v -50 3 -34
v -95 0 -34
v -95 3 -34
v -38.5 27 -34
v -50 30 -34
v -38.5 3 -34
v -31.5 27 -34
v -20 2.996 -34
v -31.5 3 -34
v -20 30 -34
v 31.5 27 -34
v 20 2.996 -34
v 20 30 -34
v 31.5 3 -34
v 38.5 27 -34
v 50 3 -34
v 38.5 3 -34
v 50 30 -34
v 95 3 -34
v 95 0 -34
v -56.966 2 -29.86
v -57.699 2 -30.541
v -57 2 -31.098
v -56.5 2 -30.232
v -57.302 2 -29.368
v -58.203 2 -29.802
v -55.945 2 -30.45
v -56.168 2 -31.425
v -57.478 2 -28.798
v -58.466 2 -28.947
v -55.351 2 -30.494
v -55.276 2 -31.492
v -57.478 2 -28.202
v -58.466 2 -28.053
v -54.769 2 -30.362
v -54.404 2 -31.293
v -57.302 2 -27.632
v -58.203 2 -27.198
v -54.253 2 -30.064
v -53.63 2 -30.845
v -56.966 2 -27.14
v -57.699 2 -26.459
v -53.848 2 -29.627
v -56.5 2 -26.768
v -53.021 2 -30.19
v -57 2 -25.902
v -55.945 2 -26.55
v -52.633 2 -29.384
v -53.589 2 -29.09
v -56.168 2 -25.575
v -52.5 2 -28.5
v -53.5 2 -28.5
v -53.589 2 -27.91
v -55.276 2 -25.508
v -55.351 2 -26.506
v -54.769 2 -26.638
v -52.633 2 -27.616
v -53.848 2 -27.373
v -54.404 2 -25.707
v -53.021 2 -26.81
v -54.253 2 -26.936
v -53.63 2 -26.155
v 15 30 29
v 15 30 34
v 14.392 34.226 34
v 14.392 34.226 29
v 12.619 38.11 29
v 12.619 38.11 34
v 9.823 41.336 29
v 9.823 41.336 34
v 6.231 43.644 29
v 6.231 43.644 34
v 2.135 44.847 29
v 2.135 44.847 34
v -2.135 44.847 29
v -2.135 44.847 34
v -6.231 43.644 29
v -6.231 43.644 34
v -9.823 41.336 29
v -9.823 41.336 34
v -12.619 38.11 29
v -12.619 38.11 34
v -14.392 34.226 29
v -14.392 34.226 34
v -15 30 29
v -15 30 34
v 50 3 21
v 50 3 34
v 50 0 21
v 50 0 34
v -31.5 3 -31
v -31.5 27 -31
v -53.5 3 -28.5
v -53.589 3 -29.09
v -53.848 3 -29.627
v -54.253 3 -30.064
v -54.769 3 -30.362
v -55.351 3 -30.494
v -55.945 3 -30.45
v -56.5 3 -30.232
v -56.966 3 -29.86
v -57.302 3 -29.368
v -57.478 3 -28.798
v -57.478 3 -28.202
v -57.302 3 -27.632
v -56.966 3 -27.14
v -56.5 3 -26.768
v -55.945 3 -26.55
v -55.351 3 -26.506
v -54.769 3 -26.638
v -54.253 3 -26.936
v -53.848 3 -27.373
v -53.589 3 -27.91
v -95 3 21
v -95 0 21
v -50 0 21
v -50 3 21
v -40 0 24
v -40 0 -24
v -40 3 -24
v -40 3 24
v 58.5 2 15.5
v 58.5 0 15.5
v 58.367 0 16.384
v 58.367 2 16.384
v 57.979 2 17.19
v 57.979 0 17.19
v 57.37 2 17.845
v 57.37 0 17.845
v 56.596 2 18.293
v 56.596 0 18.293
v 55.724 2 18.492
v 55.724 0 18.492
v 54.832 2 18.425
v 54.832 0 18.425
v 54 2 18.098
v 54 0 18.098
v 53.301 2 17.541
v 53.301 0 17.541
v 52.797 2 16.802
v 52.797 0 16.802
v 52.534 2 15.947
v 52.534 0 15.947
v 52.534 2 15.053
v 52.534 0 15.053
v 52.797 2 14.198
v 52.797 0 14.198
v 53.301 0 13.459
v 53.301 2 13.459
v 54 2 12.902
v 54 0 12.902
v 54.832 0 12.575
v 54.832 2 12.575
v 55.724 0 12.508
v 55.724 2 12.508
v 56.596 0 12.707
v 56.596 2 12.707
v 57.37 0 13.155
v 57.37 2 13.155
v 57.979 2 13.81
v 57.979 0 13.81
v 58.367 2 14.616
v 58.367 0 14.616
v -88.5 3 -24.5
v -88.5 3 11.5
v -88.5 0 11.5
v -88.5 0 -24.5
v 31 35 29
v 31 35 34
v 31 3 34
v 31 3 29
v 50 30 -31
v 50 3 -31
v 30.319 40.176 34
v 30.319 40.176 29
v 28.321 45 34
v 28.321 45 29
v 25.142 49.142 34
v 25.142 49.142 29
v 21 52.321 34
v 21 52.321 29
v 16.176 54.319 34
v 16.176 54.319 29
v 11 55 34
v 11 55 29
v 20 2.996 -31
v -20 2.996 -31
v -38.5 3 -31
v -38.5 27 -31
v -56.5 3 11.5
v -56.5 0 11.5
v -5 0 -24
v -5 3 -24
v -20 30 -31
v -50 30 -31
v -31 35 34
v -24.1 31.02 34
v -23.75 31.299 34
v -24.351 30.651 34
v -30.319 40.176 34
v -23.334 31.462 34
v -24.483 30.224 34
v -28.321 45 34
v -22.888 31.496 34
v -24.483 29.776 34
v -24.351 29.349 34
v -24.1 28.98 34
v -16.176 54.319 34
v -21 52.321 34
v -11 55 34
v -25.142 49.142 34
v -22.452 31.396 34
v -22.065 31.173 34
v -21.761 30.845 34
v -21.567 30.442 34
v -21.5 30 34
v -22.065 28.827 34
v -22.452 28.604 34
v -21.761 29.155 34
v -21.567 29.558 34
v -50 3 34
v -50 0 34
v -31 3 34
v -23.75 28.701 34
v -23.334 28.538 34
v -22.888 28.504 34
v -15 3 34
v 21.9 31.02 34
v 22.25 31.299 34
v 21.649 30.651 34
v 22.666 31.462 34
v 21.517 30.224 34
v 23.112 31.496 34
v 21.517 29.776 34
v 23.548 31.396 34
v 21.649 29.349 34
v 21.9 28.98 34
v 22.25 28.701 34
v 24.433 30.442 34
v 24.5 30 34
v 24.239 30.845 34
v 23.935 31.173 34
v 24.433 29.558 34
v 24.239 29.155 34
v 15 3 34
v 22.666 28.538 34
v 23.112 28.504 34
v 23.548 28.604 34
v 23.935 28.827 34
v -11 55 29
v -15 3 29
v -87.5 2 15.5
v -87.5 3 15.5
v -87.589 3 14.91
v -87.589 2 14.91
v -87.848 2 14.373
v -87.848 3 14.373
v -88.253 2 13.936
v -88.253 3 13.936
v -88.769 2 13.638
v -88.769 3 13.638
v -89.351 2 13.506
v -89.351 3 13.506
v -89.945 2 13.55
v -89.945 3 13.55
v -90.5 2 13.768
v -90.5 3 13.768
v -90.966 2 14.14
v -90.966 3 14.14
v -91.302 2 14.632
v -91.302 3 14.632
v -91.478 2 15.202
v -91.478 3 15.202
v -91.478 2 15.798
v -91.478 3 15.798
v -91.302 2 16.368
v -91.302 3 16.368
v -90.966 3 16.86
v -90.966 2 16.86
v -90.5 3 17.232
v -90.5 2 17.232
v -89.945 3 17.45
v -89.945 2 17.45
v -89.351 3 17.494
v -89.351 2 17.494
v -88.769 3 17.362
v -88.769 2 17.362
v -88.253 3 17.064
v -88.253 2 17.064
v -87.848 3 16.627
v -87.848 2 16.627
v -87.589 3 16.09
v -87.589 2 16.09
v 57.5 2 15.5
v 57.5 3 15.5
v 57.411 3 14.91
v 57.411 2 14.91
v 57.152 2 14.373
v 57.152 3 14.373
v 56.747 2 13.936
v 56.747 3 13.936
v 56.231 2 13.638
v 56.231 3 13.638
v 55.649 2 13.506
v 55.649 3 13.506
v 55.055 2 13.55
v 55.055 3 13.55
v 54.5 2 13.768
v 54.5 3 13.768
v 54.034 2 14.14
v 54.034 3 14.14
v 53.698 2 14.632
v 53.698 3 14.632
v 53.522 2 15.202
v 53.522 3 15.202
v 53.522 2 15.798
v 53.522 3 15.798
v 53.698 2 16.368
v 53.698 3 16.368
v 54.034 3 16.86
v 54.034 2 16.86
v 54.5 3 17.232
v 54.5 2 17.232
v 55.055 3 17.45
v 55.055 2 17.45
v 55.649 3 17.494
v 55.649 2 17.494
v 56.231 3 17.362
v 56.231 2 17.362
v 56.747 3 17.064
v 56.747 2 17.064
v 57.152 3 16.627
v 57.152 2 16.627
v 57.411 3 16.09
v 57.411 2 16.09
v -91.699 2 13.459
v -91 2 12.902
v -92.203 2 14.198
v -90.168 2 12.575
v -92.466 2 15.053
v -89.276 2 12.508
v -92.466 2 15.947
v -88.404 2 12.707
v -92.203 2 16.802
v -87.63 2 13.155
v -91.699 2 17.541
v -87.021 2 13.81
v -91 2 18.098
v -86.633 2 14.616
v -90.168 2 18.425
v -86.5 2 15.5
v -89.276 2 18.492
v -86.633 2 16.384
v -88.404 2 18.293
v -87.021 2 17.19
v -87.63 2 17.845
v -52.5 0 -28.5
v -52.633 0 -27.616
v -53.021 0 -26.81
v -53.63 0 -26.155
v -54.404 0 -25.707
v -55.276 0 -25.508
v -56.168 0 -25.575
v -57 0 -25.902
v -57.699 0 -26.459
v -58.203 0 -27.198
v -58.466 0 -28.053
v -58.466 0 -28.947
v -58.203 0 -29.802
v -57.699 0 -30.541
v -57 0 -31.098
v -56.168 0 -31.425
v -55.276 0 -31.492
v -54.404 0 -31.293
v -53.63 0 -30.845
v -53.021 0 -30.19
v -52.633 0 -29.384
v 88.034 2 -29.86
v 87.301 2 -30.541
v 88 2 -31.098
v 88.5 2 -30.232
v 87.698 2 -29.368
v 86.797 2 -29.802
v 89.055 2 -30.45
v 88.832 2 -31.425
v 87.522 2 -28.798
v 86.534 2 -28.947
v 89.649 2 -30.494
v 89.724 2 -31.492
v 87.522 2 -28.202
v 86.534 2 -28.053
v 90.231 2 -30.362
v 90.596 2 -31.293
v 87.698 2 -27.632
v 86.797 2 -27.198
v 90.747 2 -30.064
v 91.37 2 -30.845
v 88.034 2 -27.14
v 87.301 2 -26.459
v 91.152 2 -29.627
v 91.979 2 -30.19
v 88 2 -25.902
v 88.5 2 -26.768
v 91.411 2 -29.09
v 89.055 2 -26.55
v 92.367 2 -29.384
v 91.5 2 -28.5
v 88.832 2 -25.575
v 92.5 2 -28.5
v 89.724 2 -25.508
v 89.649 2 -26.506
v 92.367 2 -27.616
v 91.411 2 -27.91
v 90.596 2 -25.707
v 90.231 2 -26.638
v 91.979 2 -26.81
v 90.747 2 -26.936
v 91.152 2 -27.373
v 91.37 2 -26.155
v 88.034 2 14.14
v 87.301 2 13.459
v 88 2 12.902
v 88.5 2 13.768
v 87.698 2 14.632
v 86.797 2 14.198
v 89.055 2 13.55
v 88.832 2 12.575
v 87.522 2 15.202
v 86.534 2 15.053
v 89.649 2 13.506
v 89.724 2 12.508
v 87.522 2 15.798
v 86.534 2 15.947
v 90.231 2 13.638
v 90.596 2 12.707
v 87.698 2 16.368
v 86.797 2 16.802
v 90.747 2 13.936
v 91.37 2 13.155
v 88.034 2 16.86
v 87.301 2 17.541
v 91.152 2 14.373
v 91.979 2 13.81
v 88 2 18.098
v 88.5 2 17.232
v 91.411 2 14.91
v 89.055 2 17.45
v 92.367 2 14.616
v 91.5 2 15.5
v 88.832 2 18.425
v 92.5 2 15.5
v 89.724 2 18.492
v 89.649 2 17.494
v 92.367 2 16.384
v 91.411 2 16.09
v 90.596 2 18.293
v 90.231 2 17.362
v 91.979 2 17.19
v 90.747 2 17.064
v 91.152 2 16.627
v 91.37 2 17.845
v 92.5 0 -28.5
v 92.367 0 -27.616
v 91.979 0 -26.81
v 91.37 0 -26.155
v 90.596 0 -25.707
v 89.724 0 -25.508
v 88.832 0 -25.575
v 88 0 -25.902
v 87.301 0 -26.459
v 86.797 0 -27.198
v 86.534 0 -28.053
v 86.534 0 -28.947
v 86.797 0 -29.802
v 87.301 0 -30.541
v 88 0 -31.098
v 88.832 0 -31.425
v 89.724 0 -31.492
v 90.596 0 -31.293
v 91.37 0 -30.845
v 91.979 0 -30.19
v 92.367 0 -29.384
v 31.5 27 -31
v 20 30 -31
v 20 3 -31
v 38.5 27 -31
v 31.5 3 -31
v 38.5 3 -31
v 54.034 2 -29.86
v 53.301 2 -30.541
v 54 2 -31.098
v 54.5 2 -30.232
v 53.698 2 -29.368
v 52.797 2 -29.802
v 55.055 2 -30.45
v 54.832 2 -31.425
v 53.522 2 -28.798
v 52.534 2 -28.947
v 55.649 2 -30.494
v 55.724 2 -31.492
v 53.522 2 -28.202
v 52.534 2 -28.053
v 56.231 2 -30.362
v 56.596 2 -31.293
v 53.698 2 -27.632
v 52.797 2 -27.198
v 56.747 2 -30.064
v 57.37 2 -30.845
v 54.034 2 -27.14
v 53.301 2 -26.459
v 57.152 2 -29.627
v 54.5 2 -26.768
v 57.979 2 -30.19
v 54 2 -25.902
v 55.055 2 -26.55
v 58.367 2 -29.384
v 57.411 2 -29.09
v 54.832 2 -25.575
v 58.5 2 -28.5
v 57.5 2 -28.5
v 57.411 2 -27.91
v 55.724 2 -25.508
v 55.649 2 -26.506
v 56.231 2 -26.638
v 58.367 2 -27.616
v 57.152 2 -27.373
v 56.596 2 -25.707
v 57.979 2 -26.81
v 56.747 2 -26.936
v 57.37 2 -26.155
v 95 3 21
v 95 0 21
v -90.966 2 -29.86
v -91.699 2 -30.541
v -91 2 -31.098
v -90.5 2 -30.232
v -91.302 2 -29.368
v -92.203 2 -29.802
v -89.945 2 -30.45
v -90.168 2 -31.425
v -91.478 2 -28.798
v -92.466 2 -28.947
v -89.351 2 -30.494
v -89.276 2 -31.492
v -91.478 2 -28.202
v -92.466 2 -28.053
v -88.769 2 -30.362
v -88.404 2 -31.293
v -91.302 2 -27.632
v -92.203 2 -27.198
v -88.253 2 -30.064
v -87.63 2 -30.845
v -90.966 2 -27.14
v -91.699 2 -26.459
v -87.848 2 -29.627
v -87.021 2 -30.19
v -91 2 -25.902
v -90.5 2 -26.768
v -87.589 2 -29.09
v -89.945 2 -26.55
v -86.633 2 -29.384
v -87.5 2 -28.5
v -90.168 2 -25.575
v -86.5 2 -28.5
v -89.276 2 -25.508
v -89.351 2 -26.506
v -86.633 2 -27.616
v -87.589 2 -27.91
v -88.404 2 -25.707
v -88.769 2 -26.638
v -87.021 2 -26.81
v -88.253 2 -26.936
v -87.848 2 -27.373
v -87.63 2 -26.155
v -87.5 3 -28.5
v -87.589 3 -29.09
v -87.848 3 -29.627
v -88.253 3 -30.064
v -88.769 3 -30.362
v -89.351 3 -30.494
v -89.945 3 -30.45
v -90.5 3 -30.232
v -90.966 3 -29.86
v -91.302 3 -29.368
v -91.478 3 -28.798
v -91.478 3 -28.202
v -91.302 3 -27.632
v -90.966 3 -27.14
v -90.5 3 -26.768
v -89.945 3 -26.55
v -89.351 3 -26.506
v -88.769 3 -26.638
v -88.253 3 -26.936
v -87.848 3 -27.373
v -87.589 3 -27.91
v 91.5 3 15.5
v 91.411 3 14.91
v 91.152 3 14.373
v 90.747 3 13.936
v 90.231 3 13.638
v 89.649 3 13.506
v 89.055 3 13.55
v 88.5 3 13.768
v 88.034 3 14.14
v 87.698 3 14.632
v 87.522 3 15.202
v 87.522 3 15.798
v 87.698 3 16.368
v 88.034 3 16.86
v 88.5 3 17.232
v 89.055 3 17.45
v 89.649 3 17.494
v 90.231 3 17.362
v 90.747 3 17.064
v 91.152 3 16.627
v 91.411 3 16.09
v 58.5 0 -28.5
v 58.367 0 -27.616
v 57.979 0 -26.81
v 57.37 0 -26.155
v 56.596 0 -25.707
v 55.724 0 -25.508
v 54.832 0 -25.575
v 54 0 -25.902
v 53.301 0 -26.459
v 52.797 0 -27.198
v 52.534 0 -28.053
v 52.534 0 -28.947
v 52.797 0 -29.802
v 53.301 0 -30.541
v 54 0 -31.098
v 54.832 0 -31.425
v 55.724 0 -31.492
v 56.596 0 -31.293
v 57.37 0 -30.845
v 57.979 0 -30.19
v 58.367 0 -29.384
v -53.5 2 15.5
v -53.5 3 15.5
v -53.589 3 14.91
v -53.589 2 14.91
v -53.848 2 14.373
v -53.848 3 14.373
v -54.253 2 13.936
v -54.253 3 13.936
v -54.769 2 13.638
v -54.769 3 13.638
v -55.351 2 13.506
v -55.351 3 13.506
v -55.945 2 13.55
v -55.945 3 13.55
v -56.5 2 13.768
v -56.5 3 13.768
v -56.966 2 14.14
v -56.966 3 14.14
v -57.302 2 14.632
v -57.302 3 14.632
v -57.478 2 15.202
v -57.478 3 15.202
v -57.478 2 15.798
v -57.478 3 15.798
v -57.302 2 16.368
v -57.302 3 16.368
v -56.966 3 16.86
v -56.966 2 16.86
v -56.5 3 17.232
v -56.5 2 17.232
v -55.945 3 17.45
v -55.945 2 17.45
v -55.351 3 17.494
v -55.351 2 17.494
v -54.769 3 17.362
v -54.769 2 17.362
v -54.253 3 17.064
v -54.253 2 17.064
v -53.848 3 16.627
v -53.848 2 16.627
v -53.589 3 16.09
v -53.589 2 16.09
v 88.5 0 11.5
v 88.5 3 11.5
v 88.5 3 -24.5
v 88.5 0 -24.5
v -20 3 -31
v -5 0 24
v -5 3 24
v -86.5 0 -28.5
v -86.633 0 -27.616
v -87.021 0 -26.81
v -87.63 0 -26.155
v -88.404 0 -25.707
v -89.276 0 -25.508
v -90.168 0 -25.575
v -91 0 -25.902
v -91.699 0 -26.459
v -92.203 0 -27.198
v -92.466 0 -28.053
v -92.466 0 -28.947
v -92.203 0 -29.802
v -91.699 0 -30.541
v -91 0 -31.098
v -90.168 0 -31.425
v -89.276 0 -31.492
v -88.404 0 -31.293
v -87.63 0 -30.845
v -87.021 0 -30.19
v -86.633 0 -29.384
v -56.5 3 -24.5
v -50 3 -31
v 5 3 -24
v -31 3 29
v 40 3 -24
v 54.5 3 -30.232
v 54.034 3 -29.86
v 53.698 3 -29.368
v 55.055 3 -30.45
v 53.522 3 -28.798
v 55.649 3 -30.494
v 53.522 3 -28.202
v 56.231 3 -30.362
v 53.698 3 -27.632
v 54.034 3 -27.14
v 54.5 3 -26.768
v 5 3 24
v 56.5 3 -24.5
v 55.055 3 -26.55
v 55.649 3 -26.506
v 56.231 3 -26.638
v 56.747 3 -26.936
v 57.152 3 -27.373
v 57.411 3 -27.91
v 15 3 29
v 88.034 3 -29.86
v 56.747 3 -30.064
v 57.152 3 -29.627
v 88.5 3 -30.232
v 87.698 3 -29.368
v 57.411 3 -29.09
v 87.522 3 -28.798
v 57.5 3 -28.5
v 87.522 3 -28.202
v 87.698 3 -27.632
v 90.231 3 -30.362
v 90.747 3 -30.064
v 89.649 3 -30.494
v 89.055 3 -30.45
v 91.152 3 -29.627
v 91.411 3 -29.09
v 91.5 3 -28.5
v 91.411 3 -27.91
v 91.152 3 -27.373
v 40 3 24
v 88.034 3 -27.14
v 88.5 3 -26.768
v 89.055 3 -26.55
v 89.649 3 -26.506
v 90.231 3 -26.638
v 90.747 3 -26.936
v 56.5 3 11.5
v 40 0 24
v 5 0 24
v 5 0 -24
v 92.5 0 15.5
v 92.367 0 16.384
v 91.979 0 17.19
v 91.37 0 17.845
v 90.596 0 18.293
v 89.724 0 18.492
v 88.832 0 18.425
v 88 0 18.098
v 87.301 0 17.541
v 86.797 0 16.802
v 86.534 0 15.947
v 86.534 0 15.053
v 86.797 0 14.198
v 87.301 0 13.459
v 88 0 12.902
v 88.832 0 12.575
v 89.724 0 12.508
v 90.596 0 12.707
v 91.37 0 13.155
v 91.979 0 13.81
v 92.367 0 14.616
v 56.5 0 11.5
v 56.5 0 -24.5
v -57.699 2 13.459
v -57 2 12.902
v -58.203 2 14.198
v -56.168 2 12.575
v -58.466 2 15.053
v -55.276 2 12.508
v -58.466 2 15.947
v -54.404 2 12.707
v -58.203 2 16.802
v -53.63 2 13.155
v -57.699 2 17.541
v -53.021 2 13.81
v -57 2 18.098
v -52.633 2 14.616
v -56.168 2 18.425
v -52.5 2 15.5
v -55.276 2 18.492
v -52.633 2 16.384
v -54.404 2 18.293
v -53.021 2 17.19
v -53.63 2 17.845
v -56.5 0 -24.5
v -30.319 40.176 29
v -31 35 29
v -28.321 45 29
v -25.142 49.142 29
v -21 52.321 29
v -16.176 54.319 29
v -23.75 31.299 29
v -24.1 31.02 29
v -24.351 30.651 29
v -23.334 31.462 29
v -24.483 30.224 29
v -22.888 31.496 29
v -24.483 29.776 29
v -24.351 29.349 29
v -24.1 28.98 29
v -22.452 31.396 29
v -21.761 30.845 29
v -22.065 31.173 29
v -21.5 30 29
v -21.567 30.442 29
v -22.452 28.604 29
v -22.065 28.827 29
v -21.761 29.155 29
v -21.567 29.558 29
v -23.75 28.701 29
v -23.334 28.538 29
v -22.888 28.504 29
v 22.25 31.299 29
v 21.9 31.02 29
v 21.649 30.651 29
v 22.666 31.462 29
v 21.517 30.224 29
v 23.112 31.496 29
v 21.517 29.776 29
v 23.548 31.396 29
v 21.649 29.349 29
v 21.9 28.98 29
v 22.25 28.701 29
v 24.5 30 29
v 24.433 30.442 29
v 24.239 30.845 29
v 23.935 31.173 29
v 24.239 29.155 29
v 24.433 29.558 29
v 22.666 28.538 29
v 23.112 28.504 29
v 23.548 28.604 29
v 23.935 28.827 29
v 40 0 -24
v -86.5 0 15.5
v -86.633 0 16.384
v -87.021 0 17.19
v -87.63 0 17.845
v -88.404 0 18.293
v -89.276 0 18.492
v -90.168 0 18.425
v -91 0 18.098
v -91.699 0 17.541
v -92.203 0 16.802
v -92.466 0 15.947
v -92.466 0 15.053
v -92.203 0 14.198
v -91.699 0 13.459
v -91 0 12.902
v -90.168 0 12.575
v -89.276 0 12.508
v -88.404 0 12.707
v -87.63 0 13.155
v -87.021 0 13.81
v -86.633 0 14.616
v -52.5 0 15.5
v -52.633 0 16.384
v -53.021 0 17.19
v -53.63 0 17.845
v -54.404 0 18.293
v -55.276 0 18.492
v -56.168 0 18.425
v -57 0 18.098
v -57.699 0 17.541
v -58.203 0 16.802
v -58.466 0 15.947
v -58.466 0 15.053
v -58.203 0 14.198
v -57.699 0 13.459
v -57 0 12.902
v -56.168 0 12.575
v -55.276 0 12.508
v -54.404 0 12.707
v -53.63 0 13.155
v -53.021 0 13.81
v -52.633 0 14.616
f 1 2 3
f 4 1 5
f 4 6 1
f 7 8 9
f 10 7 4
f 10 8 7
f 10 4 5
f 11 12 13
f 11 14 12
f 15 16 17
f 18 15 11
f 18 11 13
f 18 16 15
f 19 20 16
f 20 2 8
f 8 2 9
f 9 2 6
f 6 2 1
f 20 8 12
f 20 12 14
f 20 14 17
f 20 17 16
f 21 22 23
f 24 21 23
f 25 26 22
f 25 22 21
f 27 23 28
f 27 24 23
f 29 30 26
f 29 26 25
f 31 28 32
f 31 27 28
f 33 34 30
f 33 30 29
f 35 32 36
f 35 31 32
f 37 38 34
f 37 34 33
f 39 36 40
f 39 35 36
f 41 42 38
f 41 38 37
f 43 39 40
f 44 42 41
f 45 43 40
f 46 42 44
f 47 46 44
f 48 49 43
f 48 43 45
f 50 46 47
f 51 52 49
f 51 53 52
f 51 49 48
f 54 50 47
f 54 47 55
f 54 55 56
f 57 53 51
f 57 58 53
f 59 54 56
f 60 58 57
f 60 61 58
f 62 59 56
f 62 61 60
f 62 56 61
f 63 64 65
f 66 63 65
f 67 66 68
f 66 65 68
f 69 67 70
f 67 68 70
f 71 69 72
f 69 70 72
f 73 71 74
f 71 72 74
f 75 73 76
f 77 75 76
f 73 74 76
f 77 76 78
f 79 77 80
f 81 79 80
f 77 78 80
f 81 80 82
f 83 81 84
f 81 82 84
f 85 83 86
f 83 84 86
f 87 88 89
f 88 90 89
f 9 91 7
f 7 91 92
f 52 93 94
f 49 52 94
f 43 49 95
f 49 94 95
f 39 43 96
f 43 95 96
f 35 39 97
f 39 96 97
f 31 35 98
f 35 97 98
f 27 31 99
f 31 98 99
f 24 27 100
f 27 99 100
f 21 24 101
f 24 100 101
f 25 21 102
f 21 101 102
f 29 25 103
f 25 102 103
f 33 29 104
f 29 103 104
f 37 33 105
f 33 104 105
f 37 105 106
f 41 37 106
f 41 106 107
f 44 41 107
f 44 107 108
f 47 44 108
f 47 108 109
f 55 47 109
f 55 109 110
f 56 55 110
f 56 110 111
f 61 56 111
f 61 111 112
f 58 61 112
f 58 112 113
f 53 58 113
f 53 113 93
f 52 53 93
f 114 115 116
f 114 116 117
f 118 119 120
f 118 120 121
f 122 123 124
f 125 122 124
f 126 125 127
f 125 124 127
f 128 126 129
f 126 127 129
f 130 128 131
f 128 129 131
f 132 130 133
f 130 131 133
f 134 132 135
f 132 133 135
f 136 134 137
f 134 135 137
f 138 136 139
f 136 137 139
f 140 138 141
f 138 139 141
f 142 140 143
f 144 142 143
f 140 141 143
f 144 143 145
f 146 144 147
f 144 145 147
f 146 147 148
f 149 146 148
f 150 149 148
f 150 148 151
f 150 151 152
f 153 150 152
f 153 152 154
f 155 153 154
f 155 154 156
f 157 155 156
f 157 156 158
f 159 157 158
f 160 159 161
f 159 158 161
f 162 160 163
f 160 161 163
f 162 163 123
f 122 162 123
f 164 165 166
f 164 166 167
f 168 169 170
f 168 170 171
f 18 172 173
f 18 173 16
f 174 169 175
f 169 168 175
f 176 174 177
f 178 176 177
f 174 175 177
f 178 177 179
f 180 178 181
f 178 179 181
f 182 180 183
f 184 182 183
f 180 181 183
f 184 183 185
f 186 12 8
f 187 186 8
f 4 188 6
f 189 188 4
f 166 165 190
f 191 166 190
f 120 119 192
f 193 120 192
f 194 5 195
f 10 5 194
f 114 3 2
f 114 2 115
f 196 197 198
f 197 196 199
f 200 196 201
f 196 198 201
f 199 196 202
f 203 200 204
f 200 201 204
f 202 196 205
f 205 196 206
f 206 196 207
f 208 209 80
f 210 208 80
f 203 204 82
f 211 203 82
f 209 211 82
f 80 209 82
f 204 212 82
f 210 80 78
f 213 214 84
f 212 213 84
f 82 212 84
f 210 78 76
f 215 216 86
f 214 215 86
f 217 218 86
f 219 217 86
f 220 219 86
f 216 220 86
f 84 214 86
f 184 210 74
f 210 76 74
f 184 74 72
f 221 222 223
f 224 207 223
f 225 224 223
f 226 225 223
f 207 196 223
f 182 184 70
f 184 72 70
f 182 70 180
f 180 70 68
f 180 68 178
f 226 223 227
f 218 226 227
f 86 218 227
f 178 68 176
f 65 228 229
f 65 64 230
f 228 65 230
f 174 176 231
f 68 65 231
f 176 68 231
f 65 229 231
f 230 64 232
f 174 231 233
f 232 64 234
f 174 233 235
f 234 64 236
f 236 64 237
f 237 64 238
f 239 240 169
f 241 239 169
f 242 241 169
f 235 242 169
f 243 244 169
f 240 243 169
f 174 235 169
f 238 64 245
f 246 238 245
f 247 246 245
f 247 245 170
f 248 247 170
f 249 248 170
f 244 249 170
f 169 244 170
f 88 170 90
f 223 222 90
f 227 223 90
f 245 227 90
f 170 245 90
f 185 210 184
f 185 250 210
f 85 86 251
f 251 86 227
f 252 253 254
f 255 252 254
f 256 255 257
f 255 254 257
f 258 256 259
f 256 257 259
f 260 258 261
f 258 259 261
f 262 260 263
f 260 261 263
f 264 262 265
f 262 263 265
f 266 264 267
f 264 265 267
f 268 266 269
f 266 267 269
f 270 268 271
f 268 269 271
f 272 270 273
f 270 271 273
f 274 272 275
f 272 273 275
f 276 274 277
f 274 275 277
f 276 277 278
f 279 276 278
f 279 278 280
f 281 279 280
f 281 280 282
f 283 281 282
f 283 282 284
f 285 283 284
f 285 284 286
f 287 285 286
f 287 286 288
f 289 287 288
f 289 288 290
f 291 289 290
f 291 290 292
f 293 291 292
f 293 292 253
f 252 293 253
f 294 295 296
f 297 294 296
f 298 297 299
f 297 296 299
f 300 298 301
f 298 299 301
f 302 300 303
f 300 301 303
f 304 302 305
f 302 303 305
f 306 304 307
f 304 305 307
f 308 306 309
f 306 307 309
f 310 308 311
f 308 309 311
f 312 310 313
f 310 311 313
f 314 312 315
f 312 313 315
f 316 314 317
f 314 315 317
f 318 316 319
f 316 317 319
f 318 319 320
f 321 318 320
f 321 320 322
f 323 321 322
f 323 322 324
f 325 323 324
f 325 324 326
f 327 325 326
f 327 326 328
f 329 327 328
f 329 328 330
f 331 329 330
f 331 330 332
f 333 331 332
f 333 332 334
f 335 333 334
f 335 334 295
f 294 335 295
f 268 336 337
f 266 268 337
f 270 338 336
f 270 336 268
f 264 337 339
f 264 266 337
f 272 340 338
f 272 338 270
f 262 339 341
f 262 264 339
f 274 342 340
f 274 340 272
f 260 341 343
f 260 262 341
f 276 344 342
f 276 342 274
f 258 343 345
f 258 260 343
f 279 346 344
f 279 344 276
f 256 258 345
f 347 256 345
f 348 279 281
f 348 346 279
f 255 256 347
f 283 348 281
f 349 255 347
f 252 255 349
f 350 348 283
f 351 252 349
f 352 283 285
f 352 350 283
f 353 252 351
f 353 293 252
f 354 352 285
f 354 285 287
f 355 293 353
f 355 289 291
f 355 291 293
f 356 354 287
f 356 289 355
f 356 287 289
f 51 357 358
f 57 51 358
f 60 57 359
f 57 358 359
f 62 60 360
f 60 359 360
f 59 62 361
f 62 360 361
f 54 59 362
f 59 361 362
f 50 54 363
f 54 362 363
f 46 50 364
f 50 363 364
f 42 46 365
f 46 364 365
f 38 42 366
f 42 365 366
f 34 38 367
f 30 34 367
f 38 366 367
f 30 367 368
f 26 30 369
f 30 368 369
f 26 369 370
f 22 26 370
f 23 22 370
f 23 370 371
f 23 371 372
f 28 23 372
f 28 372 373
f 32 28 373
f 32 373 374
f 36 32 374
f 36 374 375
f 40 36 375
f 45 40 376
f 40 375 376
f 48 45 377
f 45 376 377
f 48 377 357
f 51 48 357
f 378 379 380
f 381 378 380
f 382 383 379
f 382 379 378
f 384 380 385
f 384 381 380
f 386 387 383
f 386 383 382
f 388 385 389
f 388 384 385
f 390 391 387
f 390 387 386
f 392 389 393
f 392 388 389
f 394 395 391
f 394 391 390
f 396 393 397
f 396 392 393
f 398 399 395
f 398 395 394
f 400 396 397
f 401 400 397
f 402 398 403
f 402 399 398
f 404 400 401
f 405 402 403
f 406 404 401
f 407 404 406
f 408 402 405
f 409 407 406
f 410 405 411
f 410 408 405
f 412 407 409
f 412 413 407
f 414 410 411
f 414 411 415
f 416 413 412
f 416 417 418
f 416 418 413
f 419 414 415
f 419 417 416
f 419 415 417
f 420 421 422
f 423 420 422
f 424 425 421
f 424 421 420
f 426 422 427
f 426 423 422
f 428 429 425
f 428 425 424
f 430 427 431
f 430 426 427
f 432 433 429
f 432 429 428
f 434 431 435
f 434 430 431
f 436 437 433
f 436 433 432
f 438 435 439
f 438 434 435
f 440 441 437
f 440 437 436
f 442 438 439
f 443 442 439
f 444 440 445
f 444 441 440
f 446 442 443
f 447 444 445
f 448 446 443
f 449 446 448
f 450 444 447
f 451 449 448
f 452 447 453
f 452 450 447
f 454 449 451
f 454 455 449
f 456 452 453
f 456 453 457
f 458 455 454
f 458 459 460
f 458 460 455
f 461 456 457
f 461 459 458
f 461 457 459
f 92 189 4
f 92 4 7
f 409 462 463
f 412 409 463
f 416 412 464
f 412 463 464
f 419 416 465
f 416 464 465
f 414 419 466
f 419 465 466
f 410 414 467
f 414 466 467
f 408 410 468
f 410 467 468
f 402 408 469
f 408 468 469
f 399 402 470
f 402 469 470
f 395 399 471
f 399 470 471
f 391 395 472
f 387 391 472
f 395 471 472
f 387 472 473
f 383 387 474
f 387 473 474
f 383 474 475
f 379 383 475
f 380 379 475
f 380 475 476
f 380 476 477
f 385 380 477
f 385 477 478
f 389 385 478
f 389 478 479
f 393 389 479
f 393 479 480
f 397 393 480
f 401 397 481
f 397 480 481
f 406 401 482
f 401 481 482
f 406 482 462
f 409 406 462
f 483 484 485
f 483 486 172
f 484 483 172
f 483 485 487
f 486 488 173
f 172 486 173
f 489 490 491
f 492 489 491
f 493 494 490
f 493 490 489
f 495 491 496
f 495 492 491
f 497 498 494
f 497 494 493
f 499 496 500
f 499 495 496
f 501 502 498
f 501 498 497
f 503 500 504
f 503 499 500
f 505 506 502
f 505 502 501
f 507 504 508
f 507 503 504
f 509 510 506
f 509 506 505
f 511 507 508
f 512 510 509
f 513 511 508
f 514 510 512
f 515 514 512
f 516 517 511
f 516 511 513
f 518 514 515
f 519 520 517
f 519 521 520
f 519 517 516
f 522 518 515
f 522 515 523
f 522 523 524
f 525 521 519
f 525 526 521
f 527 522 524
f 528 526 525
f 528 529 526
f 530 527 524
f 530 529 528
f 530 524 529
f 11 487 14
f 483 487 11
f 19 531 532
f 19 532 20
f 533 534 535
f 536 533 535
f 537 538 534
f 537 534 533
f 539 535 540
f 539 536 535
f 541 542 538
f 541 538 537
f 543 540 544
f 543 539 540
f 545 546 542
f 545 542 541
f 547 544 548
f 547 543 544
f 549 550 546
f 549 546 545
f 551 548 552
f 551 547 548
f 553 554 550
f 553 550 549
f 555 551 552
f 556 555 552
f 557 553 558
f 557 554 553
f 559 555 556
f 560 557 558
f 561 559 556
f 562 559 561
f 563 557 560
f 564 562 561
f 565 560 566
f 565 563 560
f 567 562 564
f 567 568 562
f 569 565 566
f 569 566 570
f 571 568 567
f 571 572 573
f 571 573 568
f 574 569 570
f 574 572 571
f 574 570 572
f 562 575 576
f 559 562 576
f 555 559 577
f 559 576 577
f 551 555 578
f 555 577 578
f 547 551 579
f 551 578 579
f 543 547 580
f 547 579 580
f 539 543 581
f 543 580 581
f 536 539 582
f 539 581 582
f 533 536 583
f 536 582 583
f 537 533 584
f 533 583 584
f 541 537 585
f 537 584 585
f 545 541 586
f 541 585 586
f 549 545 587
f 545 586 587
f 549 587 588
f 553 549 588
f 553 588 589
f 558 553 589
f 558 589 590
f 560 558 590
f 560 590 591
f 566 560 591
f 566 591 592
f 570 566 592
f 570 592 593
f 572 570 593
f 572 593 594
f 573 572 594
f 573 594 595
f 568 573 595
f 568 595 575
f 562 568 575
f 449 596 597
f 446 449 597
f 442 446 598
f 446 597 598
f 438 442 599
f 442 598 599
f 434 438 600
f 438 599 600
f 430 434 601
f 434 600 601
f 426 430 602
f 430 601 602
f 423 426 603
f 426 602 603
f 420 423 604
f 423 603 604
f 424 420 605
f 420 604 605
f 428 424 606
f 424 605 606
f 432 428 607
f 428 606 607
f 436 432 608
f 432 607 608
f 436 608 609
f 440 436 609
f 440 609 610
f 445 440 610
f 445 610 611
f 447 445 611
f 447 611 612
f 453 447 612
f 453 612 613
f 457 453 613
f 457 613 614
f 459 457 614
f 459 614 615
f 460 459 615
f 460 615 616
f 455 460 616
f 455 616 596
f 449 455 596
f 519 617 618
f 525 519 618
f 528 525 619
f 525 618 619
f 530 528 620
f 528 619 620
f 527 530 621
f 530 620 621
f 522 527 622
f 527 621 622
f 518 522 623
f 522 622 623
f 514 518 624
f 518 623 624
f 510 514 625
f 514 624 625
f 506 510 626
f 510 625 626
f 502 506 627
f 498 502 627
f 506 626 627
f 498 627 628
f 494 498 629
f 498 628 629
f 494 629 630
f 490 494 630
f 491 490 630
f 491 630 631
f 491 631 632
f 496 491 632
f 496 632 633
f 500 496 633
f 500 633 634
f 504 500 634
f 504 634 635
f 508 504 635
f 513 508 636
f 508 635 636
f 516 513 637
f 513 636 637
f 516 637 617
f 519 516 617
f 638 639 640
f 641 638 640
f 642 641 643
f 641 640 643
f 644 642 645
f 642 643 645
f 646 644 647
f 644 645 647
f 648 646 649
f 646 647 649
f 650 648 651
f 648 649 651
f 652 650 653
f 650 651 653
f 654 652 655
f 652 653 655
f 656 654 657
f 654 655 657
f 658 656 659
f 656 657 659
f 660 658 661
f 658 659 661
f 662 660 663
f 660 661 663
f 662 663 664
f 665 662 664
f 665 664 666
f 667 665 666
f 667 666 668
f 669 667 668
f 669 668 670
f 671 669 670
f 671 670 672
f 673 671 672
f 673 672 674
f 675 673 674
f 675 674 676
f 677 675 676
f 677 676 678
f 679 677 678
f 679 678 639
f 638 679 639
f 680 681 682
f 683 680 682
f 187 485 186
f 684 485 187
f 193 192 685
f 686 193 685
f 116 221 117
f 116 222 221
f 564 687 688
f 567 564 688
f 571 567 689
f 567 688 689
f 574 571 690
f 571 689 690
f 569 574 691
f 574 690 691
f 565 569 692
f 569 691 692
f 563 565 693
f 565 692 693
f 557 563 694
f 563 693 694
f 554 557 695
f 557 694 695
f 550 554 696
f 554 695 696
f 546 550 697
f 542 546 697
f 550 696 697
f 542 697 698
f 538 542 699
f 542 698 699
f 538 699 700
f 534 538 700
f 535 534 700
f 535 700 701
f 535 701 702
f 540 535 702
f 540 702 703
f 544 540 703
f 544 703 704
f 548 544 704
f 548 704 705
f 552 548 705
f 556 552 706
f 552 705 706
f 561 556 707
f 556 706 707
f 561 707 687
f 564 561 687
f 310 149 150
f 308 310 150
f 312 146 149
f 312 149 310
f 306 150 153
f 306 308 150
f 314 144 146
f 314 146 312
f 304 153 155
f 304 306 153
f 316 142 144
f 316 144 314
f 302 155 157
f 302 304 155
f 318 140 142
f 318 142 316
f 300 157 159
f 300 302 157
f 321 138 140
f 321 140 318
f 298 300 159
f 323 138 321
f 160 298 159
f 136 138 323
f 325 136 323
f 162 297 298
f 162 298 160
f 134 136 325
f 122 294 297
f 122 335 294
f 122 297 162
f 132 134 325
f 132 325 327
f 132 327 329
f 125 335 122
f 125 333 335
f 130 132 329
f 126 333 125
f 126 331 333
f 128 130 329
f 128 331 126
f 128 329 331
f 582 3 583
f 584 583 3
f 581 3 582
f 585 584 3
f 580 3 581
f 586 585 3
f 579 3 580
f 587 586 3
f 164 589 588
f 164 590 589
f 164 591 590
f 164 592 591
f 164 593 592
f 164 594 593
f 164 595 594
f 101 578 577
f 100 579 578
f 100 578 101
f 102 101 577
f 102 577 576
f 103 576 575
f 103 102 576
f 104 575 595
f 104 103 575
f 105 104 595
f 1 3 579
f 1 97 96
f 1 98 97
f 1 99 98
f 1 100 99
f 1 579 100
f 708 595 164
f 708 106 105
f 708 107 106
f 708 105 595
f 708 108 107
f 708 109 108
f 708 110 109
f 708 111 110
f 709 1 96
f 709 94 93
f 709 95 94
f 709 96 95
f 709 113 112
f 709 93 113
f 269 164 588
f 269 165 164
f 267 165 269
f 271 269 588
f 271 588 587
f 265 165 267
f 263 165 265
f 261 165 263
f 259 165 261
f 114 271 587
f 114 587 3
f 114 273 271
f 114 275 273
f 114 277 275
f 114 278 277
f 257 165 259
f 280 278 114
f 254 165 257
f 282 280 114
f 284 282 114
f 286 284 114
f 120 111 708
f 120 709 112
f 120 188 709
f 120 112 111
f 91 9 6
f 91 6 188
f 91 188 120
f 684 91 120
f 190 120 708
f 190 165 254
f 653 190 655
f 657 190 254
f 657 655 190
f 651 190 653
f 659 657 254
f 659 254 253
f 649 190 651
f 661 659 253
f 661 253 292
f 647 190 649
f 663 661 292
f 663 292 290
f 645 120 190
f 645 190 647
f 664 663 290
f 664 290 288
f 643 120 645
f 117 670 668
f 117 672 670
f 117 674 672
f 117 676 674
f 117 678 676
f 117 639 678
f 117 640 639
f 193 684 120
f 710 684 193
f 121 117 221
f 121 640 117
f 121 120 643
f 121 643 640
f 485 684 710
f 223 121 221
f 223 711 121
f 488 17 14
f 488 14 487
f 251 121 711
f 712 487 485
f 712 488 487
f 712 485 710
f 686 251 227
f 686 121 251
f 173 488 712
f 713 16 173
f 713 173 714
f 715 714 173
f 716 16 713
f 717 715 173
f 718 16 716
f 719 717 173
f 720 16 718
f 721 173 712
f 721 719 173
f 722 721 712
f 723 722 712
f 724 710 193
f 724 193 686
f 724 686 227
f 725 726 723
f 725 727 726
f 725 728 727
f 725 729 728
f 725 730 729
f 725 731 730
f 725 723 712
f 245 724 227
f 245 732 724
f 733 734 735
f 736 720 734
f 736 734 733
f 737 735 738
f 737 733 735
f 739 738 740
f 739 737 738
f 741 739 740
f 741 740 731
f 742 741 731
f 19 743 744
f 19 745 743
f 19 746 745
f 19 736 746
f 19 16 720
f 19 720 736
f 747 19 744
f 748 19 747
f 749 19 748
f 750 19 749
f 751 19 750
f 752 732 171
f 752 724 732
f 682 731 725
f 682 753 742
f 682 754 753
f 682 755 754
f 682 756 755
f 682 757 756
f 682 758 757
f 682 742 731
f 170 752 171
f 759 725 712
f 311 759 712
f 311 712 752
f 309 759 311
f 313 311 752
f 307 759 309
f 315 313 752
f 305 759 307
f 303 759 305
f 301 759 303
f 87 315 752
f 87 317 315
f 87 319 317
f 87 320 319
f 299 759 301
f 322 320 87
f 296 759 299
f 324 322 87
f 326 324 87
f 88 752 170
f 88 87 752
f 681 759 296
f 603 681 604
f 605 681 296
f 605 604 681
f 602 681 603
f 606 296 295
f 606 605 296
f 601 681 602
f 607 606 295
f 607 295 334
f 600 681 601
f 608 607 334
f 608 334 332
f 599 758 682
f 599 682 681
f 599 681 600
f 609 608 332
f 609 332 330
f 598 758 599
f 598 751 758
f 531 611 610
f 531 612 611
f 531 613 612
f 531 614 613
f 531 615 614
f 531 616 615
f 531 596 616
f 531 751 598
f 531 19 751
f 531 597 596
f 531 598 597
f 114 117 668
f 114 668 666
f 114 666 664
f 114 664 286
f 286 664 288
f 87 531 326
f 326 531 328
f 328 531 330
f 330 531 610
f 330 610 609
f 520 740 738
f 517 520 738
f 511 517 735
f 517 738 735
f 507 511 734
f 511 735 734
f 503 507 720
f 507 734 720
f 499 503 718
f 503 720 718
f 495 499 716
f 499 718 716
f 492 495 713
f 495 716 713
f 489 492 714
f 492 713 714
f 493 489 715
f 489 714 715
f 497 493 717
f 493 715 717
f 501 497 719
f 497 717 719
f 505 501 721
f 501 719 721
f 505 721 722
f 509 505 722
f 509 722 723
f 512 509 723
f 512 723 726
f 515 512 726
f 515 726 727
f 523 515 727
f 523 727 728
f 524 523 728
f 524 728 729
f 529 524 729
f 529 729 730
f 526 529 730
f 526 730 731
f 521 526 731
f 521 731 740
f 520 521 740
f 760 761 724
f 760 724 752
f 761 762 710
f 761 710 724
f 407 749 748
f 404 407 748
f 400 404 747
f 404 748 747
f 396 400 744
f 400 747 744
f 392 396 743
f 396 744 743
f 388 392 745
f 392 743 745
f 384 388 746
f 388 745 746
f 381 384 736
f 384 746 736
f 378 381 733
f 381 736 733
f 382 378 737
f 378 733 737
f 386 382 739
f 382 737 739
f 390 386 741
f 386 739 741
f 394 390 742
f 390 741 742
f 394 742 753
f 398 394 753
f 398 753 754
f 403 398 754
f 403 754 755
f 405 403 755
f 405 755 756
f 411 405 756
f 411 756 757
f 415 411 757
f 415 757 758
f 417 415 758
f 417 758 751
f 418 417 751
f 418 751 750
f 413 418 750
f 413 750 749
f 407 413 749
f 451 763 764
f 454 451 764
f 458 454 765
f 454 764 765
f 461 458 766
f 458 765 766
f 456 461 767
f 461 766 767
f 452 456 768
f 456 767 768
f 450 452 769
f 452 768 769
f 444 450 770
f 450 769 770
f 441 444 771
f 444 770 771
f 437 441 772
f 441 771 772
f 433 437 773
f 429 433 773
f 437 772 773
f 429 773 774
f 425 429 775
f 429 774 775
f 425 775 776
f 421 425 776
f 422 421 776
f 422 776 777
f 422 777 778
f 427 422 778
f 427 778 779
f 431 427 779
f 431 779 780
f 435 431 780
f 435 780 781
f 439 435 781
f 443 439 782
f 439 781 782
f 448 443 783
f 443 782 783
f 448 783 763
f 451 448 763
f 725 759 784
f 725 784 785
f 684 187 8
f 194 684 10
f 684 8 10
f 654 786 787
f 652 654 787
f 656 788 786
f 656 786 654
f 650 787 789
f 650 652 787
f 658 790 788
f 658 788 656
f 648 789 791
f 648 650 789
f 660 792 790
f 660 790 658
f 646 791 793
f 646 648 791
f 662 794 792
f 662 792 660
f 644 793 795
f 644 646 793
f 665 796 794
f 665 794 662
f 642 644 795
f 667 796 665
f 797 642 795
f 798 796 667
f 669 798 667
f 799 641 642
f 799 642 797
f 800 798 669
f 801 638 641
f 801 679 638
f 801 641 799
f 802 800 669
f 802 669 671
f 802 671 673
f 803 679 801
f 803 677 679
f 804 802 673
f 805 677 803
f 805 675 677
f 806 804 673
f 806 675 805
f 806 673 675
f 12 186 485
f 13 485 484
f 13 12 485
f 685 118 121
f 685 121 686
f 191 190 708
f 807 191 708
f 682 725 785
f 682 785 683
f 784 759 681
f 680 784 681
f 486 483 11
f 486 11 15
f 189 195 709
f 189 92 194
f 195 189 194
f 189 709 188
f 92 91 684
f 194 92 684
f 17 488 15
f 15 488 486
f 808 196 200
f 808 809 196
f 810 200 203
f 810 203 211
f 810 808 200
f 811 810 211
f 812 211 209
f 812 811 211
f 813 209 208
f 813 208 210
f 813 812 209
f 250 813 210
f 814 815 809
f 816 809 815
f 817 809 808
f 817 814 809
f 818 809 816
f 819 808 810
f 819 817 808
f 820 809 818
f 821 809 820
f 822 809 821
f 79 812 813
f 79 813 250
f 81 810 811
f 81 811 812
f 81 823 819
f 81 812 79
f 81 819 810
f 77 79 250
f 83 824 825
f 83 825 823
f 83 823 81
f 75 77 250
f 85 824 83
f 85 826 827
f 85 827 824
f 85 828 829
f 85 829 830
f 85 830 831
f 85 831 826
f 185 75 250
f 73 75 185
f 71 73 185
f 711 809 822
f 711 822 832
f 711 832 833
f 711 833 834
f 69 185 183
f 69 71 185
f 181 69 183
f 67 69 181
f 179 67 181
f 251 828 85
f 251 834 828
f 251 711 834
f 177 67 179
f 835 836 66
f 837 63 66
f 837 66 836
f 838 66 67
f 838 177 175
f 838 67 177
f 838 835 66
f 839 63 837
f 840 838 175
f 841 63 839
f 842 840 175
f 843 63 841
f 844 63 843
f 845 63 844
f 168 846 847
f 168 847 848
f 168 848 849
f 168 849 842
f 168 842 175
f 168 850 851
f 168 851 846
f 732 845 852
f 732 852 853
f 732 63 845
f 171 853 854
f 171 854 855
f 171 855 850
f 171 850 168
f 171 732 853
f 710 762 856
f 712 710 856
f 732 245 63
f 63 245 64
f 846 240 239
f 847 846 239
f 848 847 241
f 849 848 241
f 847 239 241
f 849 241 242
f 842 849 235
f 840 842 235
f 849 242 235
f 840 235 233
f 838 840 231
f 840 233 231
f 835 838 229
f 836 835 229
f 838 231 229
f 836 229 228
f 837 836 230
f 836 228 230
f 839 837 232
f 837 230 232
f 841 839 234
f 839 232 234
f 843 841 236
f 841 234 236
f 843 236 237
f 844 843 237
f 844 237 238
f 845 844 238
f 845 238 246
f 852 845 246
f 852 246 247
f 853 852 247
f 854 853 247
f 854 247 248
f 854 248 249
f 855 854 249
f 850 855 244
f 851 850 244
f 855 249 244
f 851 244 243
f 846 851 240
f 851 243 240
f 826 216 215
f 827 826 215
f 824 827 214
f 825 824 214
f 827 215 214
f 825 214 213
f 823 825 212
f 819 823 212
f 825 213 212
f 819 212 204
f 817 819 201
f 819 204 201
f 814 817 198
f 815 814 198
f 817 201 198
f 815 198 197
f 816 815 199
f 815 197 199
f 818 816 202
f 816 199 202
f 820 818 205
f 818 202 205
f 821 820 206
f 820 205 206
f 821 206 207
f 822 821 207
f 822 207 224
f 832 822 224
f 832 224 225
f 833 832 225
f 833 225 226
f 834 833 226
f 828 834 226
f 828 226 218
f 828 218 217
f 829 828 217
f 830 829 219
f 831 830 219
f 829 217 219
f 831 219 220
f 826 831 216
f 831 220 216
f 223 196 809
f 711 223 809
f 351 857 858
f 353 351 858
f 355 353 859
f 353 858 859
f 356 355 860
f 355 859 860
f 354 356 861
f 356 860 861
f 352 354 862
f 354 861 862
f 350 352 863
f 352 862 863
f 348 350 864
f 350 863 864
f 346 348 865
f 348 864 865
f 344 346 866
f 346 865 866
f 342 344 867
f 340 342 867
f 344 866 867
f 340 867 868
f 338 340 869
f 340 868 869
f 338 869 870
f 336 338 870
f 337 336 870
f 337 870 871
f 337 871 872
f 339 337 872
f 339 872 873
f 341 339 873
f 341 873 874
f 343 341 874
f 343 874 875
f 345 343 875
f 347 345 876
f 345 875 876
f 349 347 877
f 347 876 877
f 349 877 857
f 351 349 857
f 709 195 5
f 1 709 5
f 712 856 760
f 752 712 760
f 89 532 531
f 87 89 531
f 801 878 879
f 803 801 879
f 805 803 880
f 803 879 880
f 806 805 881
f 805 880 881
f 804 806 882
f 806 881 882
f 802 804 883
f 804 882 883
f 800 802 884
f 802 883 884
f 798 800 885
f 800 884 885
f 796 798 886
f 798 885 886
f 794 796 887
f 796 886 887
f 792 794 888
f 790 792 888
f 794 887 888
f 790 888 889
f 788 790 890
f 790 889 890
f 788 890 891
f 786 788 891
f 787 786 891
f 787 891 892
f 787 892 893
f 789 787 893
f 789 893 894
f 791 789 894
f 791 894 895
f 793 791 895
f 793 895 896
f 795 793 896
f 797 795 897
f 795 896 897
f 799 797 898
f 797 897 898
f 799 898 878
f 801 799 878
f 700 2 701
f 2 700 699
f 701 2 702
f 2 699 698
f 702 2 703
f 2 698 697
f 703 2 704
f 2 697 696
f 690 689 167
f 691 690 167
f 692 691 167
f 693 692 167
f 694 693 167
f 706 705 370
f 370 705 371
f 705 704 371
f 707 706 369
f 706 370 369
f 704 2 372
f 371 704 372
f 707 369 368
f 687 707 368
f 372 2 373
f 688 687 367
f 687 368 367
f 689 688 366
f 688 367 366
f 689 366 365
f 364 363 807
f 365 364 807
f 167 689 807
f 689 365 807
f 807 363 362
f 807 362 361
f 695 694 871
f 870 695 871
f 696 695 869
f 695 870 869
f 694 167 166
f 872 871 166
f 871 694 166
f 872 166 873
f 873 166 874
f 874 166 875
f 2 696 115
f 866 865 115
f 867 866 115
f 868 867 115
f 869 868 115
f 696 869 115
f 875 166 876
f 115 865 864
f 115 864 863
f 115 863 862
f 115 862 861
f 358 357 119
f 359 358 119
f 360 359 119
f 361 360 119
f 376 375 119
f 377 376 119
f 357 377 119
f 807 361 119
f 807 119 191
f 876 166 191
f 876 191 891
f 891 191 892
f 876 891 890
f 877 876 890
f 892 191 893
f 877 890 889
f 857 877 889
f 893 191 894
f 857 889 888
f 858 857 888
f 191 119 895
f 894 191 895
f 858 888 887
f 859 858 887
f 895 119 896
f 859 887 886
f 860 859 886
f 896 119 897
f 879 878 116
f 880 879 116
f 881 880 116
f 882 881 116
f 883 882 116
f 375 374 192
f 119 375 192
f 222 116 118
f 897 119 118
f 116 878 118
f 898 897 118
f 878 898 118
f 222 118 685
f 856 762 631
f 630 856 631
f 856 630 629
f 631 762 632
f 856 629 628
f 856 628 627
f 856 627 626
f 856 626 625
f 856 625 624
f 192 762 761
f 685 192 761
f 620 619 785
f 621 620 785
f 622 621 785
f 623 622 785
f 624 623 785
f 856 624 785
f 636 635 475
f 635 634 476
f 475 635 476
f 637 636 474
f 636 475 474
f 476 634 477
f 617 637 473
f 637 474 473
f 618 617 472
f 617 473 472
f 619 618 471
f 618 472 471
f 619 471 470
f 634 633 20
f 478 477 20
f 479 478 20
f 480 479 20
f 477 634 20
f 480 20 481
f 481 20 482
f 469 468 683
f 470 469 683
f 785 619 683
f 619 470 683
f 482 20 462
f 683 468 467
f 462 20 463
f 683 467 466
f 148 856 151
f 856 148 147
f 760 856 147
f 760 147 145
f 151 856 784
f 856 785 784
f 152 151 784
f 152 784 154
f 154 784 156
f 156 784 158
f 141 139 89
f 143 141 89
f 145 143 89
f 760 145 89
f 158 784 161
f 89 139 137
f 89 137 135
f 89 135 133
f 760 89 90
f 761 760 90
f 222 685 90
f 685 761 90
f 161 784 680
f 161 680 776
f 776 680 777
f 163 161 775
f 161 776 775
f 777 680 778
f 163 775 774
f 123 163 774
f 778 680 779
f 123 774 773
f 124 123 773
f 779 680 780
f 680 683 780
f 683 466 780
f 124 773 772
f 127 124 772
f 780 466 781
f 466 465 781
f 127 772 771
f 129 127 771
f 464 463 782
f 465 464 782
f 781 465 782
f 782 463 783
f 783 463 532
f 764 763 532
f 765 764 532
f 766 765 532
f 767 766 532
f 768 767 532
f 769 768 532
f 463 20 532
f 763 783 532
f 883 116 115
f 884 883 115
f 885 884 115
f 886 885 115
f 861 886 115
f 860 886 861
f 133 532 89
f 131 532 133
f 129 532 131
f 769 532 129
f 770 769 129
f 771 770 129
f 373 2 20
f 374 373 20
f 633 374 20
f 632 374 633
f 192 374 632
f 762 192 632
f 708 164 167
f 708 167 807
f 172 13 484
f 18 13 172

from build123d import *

# Parameters (mm, degrees)
SKETCH_1_W          = 100
SKETCH_1_H          = 68
EXTRUDE_1_DEPTH     = 3
SKETCH_2_W          = 100
SKETCH_2_H          = 3
EXTRUDE_2_DEPTH     = 27
SKETCH_3_W          = 7
SKETCH_3_H          = 24
CUT_EXTRUDE_2_DEPTH = 27
SKETCH_4_W          = 62
SKETCH_4_H          = 5
EXTRUDE_3_DEPTH     = 52
SKETCH_5_R          = 1.5
CUT_EXTRUDE_4_DEPTH = 5
SKETCH_7_W          = 35
SKETCH_7_H          = 48
CUT_EXTRUDE_5_DEPTH = 3
SKETCH_8_W          = 55
SKETCH_8_H          = 3
EXTRUDE_4_DEPTH     = 45
SKETCH_11_W         = 55
SKETCH_11_H         = 3
EXTRUDE_5_DEPTH     = 45
SKETCH_10_R         = 2
SKETCH_10_W         = 32
SKETCH_10_H         = 36
CUT_EXTRUDE_6_DEPTH = 45
SKETCH_12_R         = 3
CUT_EXTRUDE_7_DEPTH = 2
SKETCH_13_W         = 40
SKETCH_13_H         = 27.004423226
CUT_EXTRUDE_8_DEPTH = 3
FILLET_1_R          = 20


with BuildPart() as part:
    # 스케치1 → 보스-돌출1 (new body)
    with BuildSketch(Plane(origin=(0, 0, 0), x_dir=(1, 0, 0), z_dir=(0, 1, 0))):
        Rectangle(SKETCH_1_W, SKETCH_1_H)
    extrude(amount=EXTRUDE_1_DEPTH)

    # 스케치2 → 보스-돌출2 (add)
    with BuildSketch(Plane(origin=(0, 3, 0), x_dir=(1, 0, 0), z_dir=(0, 1, 0))):
        with Locations((0, 32.5)):
            Rectangle(SKETCH_2_W, SKETCH_2_H)
    extrude(amount=EXTRUDE_2_DEPTH)

    # 스케치3 → 컷-돌출2 (cut)
    with BuildSketch(Plane.XY.offset(-31)):
        with Locations((-35, 15)):
            Rectangle(SKETCH_3_W, SKETCH_3_H)
        with Locations((35, 15)):
            Rectangle(SKETCH_3_W, SKETCH_3_H)
    extrude(amount=-CUT_EXTRUDE_2_DEPTH, mode=Mode.SUBTRACT)

    # 스케치4 → 보스-돌출3 (add)
    with BuildSketch(Plane(origin=(0, 3, 0), x_dir=(1, 0, 0), z_dir=(0, 1, 0))):
        with Locations((0, -31.5)):
            Rectangle(SKETCH_4_W, SKETCH_4_H)
    extrude(amount=EXTRUDE_3_DEPTH)

    # 스케치5 → 컷-돌출4 (cut)
    with BuildSketch(Plane.XY.offset(34)):
        with Locations((-23, 30)):
            Circle(SKETCH_5_R)
        with Locations((23, 30)):
            Circle(SKETCH_5_R)
        with BuildLine():
            Line((-15, 30), (-15, 3))
            Line((-15, 3), (15, 3))
            Line((15, 3), (15, 30))
            ThreePointArc((15, 30), (0, 45), (-15, 30))
        make_face()
    extrude(amount=-CUT_EXTRUDE_4_DEPTH, mode=Mode.SUBTRACT)

    # 스케치7 → 컷-돌출5 (cut)
    with BuildSketch(Plane.XZ):
        with Locations((22.5, 0)):
            Rectangle(SKETCH_7_W, SKETCH_7_H)
        with Locations((-22.5, 0)):
            Rectangle(SKETCH_7_W, SKETCH_7_H)
    extrude(amount=-CUT_EXTRUDE_5_DEPTH, mode=Mode.SUBTRACT)

    # 스케치8 → 보스-돌출4 (add)
    with BuildSketch(Plane(origin=(50, 0, 0), x_dir=(0, 0, -1), z_dir=(1, 0, 0))):
        with Locations((6.5, 1.5)):
            Rectangle(SKETCH_8_W, SKETCH_8_H)
    extrude(amount=EXTRUDE_4_DEPTH)

    # 스케치11 → 보스-돌출5 (add)
    with BuildSketch(Plane.ZY.offset(50)):
        with Locations((-6.5, 1.5)):
            Rectangle(SKETCH_11_W, SKETCH_11_H)
    extrude(amount=EXTRUDE_5_DEPTH)

    # 스케치10 → 컷-돌출6 (cut)
    with BuildSketch(Plane(origin=(0, 3, 0), x_dir=(1, 0, 0), z_dir=(0, 1, 0))):
        with Locations((55.5, -15.5)):
            Circle(SKETCH_10_R)
        with Locations((55.5, 28.5)):
            Circle(SKETCH_10_R)
        with Locations((89.5, 28.5)):
            Circle(SKETCH_10_R)
        with Locations((89.5, -15.5)):
            Circle(SKETCH_10_R)
        with Locations((-89.5, -15.5)):
            Circle(SKETCH_10_R)
        with Locations((-55.5, -15.5)):
            Circle(SKETCH_10_R)
        with Locations((-55.5, 28.5)):
            Circle(SKETCH_10_R)
        with Locations((-89.5, 28.5)):
            Circle(SKETCH_10_R)
        with Locations((72.5, 6.5)):
            Rectangle(SKETCH_10_W, SKETCH_10_H)
        with Locations((-72.5, 6.5)):
            Rectangle(SKETCH_10_W, SKETCH_10_H)
    extrude(amount=-CUT_EXTRUDE_6_DEPTH, mode=Mode.SUBTRACT)

    # 스케치12 → 컷-돌출7 (cut)
    with BuildSketch(Plane.XZ):
        with Locations((89.5, -28.5)):
            Circle(SKETCH_12_R)
        with Locations((89.5, 15.5)):
            Circle(SKETCH_12_R)
        with Locations((55.5, 15.5)):
            Circle(SKETCH_12_R)
        with Locations((55.5, -28.5)):
            Circle(SKETCH_12_R)
        with Locations((-89.5, 15.5)):
            Circle(SKETCH_12_R)
        with Locations((-55.5, 15.5)):
            Circle(SKETCH_12_R)
        with Locations((-55.5, -28.5)):
            Circle(SKETCH_12_R)
        with Locations((-89.5, -28.5)):
            Circle(SKETCH_12_R)
    extrude(amount=-CUT_EXTRUDE_7_DEPTH, mode=Mode.SUBTRACT)

    # 스케치13 → 컷-돌출8 (cut)
    with BuildSketch(Plane(origin=(0, 0, -34), x_dir=(-1, 0, 0), z_dir=(0, 0, -1))):
        with Locations((0, 16.497788387)):
            Rectangle(SKETCH_13_W, SKETCH_13_H)
    extrude(amount=-CUT_EXTRUDE_8_DEPTH, mode=Mode.SUBTRACT)

    # 필렛1
    fillet_1_edges = [part.edges().sort_by_distance(p)[0] for p in [
        (31, 55, 31.5),
        (-31, 55, 31.5),
    ]]
    fillet(fillet_1_edges, radius=FILLET_1_R)


solid = part.part
